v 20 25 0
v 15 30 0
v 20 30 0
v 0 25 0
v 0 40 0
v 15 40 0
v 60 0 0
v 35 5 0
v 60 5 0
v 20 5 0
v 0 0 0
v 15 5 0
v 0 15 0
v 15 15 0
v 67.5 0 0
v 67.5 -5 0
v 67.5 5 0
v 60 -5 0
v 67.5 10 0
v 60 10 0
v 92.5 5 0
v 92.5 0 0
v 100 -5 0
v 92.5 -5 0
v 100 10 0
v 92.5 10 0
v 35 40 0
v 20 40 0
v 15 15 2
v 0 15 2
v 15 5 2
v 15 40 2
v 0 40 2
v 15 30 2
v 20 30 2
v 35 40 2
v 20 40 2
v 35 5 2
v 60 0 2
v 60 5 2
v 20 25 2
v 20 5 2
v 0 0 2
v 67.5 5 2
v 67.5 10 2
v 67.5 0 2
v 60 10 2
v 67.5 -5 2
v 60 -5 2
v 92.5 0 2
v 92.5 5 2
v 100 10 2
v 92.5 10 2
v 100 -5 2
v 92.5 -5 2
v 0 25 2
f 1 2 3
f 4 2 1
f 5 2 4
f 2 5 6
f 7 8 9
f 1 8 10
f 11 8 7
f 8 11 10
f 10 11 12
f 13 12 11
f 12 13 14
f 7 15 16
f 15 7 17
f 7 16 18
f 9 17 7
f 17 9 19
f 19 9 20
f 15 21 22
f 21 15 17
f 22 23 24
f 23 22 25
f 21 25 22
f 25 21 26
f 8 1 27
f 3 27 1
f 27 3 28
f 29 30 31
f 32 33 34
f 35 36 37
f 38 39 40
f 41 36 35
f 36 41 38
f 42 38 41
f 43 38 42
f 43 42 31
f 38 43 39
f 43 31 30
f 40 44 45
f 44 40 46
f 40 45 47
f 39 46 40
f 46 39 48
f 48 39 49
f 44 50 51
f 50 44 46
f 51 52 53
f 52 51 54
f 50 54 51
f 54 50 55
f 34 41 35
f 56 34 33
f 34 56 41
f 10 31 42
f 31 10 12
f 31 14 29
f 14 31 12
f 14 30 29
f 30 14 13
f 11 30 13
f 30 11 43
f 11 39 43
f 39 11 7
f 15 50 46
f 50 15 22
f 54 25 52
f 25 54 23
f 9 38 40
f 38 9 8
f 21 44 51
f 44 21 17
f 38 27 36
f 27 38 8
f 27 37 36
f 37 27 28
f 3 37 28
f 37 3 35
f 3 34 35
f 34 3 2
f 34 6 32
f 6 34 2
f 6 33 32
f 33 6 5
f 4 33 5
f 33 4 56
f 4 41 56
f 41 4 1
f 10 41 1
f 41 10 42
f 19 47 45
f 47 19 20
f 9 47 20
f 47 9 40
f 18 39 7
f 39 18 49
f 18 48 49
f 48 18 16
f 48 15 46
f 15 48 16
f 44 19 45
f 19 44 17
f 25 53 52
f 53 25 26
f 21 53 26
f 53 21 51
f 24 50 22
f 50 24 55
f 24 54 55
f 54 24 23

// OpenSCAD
extension_length = 100;
extension_width = 5;
tooth_width = 15;
bracket_thickness = 2;
tooth_gap = 10;

union(){
//actual braket template
linear_extrude(bracket_thickness){
    square([extension_length, 
            extension_width]);
    square([tooth_width, 
            tooth_width]);
    translate([tooth_gap*2, 0, 0])
            square([tooth_width, 
                    tooth_width*2+tooth_gap]);
    translate([0, tooth_gap+tooth_width,0])
            square([tooth_width, tooth_width]);
    translate([0, tooth_gap+tooth_width,0])
            square([tooth_width*2, extension_width]);};
                
// add little nubs to make it usefulish
linear_extrude(bracket_thickness){
    translate([3*extension_length/5,
               -(tooth_width-extension_width)/2,0])
        square([tooth_width/2, tooth_width]);
    translate([extension_length-tooth_width/2,
               -(tooth_width-extension_width)/2,0])
        square([tooth_width/2, tooth_width]);};}
